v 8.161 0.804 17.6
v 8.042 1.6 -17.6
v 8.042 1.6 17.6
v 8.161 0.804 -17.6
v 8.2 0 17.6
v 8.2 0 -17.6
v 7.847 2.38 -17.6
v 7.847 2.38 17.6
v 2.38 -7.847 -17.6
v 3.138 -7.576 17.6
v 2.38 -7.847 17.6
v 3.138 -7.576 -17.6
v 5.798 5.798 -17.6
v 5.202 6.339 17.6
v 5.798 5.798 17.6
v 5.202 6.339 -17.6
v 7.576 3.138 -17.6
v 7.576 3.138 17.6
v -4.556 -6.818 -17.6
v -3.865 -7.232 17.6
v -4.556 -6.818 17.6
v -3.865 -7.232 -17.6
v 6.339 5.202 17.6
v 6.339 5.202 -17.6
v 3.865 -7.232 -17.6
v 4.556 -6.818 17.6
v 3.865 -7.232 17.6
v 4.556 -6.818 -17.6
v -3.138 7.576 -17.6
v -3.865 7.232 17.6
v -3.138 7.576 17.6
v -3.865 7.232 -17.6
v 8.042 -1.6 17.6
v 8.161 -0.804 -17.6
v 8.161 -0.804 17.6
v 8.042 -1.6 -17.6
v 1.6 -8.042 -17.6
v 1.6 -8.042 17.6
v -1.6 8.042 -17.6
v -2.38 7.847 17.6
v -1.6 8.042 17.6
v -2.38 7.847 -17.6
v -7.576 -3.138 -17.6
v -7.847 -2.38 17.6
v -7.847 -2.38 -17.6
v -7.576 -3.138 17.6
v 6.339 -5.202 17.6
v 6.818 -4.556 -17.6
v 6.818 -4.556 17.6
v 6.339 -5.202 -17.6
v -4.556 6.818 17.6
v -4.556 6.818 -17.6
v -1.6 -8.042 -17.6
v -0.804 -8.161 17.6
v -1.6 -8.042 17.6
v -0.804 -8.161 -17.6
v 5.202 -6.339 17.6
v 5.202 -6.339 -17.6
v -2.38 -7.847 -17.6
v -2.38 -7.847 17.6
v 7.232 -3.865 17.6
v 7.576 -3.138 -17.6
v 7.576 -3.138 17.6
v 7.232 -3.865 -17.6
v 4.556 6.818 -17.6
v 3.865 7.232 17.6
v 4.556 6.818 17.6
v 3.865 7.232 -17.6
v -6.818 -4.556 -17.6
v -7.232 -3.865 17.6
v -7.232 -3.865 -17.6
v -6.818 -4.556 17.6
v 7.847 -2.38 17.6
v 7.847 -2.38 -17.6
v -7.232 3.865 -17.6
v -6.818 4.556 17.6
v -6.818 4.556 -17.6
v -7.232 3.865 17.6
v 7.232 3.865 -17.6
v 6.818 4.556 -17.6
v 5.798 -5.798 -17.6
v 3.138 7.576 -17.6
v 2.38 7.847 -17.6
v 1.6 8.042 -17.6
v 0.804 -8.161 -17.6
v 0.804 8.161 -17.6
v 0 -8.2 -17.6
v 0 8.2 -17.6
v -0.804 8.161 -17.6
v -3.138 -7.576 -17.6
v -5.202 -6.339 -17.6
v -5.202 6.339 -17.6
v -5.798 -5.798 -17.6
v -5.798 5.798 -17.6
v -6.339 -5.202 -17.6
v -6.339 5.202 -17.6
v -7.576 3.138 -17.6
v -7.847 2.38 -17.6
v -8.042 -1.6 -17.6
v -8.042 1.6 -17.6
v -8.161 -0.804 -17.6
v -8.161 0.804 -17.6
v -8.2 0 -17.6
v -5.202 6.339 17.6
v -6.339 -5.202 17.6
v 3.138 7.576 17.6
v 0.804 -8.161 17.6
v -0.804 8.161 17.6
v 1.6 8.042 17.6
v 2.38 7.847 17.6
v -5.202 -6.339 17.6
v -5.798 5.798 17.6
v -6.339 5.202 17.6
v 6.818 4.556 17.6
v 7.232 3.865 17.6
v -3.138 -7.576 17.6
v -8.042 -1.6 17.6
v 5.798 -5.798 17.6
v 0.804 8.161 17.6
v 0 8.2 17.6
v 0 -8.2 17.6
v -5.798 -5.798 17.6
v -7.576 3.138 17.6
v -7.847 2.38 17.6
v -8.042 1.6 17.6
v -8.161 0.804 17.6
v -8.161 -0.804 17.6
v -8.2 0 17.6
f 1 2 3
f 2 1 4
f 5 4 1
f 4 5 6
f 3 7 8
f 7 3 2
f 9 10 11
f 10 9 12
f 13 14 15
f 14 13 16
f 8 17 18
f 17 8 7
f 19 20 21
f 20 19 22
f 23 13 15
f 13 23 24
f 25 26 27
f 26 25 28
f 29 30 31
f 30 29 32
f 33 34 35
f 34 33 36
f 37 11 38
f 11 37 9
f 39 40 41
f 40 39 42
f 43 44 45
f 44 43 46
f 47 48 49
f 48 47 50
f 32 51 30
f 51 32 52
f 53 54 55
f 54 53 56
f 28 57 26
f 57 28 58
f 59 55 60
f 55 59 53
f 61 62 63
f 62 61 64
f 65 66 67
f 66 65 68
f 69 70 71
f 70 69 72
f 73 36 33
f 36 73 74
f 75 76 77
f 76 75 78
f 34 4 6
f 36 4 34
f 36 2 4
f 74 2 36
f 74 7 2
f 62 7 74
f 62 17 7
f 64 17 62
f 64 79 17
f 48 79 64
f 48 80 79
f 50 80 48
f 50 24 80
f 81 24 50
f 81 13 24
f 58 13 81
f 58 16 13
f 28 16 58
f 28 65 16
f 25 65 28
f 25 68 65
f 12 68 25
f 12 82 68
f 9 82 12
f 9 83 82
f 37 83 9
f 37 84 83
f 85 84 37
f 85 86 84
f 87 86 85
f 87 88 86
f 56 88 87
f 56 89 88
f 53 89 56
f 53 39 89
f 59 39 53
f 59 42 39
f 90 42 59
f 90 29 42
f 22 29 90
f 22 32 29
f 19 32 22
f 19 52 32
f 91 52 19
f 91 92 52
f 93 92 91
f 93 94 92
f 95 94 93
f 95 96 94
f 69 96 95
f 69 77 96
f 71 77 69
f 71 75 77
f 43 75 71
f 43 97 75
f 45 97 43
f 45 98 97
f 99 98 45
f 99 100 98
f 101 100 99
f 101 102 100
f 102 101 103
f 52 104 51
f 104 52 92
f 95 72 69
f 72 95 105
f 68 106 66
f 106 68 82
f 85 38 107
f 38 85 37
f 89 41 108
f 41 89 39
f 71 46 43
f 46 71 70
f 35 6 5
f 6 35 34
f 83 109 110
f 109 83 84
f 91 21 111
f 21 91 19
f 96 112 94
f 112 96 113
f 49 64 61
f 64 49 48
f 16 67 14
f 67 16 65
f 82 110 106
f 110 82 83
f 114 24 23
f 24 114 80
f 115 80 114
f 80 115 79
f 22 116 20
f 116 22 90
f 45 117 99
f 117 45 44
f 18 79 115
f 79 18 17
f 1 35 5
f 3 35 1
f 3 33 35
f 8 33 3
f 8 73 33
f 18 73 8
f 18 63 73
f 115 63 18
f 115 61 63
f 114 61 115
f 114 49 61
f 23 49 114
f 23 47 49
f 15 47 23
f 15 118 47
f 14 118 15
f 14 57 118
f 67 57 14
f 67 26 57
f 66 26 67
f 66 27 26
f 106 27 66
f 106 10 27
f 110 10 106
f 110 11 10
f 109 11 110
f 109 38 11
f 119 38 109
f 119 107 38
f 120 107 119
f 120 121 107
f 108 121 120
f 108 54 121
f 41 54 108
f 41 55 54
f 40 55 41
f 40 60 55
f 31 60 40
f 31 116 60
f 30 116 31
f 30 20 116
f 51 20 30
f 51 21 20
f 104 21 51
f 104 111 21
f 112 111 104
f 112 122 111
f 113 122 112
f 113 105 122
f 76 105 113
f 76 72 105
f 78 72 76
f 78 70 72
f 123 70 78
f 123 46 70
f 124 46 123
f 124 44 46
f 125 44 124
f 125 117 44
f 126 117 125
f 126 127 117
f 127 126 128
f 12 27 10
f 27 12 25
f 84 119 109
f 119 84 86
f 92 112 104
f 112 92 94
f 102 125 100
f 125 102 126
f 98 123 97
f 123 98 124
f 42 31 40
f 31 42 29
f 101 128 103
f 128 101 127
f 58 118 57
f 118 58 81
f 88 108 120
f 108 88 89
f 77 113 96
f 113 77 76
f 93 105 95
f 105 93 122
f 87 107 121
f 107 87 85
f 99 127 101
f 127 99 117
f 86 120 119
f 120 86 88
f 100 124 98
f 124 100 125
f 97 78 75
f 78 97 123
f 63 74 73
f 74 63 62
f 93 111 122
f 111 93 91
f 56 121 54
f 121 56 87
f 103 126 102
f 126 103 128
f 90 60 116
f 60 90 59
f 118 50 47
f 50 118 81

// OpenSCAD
// Parameters
height_mm = 35.2; //[17.6:70.4:0.1]
diameter_mm = 16.4; //[8.2:32.8:0.1]
positive_terminal_height_mm = 1.0; //[0.5:2.0:0.1]
positive_terminal_diameter_mm = 5.0; //[2.5:10.0:0.1]
negative_terminal_recess_mm = 0.0; //[0.0:2.0:0.1]
connect_overlap_mm = 0.8; //[0.5:2.0:0.1]

// Battery - complete geometry
module battery() {
  color("Silver") {
    // Main body
    cylinder(h=height_mm, r=diameter_mm/2, center=true, $fn=64);
    
    // Positive terminal bump
    translate([0, 0, height_mm/2 - connect_overlap_mm])
      cylinder(h=positive_terminal_height_mm, r=positive_terminal_diameter_mm/2, center=true, $fn=32);
    
    // Negative terminal flat
    translate([0, 0, -height_mm/2 + connect_overlap_mm/2])
      cylinder(h=connect_overlap_mm, r=diameter_mm/2, center=true, $fn=64);
    
    // Negative terminal recess (if any)
    if (negative_terminal_recess_mm > 0) {
      difference() {
        cylinder(h=negative_terminal_recess_mm, r=diameter_mm/2, center=true, $fn=64);
        translate([0, 0, -negative_terminal_recess_mm/2])
          cylinder(h=negative_terminal_recess_mm, r=diameter_mm/2 - 1, center=true, $fn=64);
      }
    }
  }
}

// Assembly
module assembly() {
  battery();
}

assembly();
